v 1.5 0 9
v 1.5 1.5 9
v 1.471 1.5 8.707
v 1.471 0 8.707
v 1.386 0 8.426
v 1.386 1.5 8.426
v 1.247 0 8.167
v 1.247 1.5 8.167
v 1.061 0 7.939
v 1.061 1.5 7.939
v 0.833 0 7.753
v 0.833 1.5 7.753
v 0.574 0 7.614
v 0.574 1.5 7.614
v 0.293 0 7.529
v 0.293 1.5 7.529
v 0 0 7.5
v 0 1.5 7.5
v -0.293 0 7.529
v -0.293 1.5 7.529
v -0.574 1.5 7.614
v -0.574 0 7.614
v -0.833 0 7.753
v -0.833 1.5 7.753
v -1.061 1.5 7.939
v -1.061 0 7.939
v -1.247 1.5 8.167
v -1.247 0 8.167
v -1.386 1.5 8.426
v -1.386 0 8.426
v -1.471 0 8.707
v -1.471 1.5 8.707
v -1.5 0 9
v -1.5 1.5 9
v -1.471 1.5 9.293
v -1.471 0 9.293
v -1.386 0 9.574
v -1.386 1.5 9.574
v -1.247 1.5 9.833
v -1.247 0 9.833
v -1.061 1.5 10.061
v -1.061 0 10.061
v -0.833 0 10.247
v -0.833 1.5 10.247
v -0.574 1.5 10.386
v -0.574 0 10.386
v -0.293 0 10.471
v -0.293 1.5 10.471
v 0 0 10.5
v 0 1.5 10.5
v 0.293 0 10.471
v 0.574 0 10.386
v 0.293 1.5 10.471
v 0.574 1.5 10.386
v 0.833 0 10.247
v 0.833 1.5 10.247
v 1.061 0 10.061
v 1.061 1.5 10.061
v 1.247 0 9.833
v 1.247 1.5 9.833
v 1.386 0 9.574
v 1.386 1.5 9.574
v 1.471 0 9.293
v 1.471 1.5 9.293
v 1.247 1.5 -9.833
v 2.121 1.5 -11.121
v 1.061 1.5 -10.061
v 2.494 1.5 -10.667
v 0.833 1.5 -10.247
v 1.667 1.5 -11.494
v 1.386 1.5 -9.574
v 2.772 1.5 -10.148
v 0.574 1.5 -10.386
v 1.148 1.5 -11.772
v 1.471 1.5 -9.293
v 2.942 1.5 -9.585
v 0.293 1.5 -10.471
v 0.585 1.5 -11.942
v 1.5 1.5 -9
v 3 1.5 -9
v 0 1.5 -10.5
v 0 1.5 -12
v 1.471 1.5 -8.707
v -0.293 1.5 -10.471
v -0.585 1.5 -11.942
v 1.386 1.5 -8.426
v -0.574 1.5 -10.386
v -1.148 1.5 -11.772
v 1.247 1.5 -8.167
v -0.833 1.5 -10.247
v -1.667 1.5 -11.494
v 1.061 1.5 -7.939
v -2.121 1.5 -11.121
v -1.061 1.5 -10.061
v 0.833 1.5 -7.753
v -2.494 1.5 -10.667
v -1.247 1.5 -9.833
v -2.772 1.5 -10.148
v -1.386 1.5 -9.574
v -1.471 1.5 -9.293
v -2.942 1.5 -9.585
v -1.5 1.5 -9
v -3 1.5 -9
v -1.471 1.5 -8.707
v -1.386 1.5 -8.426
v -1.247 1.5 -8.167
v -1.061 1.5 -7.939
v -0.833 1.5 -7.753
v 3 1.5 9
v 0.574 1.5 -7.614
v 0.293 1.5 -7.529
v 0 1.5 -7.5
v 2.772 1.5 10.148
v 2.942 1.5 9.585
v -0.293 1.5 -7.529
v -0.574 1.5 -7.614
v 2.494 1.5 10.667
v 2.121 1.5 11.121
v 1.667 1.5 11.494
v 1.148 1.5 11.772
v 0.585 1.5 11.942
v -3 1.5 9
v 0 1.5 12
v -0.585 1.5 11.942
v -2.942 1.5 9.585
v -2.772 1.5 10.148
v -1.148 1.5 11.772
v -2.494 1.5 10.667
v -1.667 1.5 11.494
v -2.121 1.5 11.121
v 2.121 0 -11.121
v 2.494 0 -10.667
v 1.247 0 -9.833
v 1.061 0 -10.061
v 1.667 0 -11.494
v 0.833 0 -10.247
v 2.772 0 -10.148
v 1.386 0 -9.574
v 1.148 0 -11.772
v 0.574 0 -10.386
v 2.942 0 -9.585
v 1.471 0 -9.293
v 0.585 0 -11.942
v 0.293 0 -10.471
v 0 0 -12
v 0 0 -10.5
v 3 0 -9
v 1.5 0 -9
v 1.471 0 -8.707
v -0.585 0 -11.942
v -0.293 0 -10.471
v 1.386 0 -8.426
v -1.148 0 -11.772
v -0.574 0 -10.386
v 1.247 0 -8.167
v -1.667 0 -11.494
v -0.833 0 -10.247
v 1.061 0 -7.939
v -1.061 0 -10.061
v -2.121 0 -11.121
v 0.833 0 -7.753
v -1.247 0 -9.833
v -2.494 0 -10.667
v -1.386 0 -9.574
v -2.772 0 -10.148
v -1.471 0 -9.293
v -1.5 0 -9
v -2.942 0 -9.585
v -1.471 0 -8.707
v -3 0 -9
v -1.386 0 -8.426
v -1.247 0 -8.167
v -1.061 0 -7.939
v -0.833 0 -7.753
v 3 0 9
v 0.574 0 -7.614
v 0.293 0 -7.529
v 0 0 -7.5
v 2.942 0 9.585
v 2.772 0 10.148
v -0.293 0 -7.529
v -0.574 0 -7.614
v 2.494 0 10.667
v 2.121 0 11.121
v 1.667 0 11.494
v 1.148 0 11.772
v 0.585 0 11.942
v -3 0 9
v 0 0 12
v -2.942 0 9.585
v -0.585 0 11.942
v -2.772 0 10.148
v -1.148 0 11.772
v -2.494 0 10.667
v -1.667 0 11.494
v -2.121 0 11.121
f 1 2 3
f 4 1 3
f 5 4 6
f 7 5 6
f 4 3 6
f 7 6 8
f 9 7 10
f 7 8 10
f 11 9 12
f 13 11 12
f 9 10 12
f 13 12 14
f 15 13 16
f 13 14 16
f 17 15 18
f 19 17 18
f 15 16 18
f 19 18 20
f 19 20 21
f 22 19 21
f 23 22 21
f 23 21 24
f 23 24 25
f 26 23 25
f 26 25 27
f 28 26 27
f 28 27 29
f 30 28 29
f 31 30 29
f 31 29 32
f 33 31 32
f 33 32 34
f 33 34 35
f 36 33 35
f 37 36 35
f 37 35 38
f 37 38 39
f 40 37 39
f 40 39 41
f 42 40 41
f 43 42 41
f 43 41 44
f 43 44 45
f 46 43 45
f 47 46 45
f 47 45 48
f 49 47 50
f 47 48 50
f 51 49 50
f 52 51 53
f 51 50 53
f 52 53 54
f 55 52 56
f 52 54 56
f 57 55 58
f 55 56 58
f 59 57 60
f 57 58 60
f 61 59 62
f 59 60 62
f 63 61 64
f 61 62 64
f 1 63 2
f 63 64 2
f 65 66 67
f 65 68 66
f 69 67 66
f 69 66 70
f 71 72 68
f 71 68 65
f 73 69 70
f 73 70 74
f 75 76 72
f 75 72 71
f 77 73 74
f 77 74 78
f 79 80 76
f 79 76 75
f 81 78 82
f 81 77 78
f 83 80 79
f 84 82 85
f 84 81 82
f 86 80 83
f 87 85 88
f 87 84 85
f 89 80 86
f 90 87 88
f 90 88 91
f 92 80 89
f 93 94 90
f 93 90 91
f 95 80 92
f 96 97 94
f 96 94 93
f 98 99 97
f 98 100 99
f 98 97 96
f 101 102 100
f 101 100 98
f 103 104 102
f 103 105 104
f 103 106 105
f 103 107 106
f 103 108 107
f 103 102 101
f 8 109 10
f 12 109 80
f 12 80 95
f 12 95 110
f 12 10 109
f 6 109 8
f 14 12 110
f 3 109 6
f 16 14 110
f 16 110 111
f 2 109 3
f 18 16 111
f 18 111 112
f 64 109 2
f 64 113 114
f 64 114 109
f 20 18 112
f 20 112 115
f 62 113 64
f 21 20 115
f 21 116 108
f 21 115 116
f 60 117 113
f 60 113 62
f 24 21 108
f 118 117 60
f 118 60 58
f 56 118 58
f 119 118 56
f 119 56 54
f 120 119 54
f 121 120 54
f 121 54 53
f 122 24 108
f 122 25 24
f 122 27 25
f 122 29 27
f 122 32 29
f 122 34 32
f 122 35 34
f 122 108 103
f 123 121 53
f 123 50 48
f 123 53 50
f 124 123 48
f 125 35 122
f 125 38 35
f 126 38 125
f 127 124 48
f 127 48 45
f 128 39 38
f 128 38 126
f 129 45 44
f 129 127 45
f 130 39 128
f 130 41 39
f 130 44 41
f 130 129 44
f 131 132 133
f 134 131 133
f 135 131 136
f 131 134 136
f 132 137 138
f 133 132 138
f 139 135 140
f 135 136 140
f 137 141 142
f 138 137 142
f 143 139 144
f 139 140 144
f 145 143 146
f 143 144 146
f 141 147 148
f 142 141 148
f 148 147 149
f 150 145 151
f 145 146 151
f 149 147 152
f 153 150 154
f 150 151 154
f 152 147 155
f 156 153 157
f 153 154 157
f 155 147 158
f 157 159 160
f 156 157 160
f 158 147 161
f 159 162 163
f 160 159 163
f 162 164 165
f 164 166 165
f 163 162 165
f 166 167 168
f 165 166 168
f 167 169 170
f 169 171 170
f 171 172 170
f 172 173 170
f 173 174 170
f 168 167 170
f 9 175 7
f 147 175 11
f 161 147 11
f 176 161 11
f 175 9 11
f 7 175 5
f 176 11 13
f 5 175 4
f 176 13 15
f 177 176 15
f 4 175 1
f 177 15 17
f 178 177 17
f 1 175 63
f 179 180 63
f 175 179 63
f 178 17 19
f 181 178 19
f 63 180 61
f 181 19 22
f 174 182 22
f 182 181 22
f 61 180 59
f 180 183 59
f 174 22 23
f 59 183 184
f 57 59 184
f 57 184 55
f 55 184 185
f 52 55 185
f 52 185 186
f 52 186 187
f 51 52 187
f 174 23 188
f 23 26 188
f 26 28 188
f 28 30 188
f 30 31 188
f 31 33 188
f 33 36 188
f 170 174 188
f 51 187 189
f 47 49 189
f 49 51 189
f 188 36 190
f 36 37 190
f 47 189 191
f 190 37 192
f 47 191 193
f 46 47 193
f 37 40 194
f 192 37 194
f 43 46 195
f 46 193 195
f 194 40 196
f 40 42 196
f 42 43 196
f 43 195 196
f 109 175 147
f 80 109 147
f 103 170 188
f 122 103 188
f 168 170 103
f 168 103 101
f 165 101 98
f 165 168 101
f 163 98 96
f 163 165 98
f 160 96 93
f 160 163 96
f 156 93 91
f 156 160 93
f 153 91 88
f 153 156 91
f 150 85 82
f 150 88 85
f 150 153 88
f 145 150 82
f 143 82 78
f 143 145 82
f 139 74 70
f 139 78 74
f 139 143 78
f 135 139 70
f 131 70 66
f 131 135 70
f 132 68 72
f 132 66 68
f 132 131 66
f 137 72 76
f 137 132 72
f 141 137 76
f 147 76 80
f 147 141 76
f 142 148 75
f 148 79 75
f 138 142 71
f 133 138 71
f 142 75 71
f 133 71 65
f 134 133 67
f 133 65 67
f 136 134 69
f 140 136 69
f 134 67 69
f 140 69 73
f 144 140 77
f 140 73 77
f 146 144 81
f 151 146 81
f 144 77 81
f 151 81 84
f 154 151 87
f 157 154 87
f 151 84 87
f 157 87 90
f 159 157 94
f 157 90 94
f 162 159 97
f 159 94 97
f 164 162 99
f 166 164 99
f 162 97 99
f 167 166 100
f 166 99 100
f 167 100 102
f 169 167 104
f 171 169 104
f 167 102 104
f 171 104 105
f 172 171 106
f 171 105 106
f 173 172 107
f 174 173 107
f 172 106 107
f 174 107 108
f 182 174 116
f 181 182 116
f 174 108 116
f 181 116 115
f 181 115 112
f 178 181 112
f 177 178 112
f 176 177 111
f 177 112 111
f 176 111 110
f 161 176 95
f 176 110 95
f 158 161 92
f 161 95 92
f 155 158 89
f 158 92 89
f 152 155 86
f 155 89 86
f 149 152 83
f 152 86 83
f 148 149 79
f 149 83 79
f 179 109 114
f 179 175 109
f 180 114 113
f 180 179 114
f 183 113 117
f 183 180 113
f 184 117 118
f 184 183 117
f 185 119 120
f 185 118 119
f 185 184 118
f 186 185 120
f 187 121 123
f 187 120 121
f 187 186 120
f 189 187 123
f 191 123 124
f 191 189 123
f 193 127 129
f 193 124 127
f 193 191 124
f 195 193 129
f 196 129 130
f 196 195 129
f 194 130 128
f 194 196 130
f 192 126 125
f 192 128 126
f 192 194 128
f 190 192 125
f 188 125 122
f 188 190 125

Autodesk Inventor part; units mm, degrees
ref_plane "YZ Plane" through (0, 0, 0) normal (1, 0, 0) x (0, 1, 0)
ref_plane "XZ Plane" through (0, 0, 0) normal (0, 1, 0) x (-1, 0, 0)
ref_plane "XY Plane" through (0, 0, 0) normal (0, 0, 1) x (1, 0, 0)
sketch "Sketch1" plane through (0, 0, 0) normal (0, 1, 0) x (-1, 0, 0)
  line L0 (-3, -9) -> (3, -9)
  line L1 (3, -9) -> (3, 9)
  line L2 (3, 9) -> (-3, 9)
  line L3 (-3, 9) -> (-3, -9)
  line L4 (-3, -9) -> (3, 9) construction
  line L5 (3, -9) -> (-3, 9) construction
  circle A0 centre (0, -9) radius 3
  circle A1 centre (0, 9) radius 3
  point P0 (0, 0)
  dimension "d0" = 6
  dimension "d1" = 18
  dimension "d2" = 6
extrude "Extrusion1" add sketch "Sketch1" along normal blind 1.5
sketch "Sketch2" plane through (0, 1.5, 0) normal (0, 1, 0) x (1, 0, 0)
  arc A0 (-3, -9) -> (3, -9) centre (0, -9) ccw projected
  arc A1 (3, 9) -> (-3, 9) centre (0, 9) ccw projected
  circle A2 centre (0, 9) radius 1.5
  circle A3 centre (0, -9) radius 1.5
  point P0 (0, 0)
  dimension "d5" = 3
  dimension "d6" = 3
extrude "Extrusion2" cut sketch "Sketch2" against normal blind 2
properties part number "ruka_tahlo"
